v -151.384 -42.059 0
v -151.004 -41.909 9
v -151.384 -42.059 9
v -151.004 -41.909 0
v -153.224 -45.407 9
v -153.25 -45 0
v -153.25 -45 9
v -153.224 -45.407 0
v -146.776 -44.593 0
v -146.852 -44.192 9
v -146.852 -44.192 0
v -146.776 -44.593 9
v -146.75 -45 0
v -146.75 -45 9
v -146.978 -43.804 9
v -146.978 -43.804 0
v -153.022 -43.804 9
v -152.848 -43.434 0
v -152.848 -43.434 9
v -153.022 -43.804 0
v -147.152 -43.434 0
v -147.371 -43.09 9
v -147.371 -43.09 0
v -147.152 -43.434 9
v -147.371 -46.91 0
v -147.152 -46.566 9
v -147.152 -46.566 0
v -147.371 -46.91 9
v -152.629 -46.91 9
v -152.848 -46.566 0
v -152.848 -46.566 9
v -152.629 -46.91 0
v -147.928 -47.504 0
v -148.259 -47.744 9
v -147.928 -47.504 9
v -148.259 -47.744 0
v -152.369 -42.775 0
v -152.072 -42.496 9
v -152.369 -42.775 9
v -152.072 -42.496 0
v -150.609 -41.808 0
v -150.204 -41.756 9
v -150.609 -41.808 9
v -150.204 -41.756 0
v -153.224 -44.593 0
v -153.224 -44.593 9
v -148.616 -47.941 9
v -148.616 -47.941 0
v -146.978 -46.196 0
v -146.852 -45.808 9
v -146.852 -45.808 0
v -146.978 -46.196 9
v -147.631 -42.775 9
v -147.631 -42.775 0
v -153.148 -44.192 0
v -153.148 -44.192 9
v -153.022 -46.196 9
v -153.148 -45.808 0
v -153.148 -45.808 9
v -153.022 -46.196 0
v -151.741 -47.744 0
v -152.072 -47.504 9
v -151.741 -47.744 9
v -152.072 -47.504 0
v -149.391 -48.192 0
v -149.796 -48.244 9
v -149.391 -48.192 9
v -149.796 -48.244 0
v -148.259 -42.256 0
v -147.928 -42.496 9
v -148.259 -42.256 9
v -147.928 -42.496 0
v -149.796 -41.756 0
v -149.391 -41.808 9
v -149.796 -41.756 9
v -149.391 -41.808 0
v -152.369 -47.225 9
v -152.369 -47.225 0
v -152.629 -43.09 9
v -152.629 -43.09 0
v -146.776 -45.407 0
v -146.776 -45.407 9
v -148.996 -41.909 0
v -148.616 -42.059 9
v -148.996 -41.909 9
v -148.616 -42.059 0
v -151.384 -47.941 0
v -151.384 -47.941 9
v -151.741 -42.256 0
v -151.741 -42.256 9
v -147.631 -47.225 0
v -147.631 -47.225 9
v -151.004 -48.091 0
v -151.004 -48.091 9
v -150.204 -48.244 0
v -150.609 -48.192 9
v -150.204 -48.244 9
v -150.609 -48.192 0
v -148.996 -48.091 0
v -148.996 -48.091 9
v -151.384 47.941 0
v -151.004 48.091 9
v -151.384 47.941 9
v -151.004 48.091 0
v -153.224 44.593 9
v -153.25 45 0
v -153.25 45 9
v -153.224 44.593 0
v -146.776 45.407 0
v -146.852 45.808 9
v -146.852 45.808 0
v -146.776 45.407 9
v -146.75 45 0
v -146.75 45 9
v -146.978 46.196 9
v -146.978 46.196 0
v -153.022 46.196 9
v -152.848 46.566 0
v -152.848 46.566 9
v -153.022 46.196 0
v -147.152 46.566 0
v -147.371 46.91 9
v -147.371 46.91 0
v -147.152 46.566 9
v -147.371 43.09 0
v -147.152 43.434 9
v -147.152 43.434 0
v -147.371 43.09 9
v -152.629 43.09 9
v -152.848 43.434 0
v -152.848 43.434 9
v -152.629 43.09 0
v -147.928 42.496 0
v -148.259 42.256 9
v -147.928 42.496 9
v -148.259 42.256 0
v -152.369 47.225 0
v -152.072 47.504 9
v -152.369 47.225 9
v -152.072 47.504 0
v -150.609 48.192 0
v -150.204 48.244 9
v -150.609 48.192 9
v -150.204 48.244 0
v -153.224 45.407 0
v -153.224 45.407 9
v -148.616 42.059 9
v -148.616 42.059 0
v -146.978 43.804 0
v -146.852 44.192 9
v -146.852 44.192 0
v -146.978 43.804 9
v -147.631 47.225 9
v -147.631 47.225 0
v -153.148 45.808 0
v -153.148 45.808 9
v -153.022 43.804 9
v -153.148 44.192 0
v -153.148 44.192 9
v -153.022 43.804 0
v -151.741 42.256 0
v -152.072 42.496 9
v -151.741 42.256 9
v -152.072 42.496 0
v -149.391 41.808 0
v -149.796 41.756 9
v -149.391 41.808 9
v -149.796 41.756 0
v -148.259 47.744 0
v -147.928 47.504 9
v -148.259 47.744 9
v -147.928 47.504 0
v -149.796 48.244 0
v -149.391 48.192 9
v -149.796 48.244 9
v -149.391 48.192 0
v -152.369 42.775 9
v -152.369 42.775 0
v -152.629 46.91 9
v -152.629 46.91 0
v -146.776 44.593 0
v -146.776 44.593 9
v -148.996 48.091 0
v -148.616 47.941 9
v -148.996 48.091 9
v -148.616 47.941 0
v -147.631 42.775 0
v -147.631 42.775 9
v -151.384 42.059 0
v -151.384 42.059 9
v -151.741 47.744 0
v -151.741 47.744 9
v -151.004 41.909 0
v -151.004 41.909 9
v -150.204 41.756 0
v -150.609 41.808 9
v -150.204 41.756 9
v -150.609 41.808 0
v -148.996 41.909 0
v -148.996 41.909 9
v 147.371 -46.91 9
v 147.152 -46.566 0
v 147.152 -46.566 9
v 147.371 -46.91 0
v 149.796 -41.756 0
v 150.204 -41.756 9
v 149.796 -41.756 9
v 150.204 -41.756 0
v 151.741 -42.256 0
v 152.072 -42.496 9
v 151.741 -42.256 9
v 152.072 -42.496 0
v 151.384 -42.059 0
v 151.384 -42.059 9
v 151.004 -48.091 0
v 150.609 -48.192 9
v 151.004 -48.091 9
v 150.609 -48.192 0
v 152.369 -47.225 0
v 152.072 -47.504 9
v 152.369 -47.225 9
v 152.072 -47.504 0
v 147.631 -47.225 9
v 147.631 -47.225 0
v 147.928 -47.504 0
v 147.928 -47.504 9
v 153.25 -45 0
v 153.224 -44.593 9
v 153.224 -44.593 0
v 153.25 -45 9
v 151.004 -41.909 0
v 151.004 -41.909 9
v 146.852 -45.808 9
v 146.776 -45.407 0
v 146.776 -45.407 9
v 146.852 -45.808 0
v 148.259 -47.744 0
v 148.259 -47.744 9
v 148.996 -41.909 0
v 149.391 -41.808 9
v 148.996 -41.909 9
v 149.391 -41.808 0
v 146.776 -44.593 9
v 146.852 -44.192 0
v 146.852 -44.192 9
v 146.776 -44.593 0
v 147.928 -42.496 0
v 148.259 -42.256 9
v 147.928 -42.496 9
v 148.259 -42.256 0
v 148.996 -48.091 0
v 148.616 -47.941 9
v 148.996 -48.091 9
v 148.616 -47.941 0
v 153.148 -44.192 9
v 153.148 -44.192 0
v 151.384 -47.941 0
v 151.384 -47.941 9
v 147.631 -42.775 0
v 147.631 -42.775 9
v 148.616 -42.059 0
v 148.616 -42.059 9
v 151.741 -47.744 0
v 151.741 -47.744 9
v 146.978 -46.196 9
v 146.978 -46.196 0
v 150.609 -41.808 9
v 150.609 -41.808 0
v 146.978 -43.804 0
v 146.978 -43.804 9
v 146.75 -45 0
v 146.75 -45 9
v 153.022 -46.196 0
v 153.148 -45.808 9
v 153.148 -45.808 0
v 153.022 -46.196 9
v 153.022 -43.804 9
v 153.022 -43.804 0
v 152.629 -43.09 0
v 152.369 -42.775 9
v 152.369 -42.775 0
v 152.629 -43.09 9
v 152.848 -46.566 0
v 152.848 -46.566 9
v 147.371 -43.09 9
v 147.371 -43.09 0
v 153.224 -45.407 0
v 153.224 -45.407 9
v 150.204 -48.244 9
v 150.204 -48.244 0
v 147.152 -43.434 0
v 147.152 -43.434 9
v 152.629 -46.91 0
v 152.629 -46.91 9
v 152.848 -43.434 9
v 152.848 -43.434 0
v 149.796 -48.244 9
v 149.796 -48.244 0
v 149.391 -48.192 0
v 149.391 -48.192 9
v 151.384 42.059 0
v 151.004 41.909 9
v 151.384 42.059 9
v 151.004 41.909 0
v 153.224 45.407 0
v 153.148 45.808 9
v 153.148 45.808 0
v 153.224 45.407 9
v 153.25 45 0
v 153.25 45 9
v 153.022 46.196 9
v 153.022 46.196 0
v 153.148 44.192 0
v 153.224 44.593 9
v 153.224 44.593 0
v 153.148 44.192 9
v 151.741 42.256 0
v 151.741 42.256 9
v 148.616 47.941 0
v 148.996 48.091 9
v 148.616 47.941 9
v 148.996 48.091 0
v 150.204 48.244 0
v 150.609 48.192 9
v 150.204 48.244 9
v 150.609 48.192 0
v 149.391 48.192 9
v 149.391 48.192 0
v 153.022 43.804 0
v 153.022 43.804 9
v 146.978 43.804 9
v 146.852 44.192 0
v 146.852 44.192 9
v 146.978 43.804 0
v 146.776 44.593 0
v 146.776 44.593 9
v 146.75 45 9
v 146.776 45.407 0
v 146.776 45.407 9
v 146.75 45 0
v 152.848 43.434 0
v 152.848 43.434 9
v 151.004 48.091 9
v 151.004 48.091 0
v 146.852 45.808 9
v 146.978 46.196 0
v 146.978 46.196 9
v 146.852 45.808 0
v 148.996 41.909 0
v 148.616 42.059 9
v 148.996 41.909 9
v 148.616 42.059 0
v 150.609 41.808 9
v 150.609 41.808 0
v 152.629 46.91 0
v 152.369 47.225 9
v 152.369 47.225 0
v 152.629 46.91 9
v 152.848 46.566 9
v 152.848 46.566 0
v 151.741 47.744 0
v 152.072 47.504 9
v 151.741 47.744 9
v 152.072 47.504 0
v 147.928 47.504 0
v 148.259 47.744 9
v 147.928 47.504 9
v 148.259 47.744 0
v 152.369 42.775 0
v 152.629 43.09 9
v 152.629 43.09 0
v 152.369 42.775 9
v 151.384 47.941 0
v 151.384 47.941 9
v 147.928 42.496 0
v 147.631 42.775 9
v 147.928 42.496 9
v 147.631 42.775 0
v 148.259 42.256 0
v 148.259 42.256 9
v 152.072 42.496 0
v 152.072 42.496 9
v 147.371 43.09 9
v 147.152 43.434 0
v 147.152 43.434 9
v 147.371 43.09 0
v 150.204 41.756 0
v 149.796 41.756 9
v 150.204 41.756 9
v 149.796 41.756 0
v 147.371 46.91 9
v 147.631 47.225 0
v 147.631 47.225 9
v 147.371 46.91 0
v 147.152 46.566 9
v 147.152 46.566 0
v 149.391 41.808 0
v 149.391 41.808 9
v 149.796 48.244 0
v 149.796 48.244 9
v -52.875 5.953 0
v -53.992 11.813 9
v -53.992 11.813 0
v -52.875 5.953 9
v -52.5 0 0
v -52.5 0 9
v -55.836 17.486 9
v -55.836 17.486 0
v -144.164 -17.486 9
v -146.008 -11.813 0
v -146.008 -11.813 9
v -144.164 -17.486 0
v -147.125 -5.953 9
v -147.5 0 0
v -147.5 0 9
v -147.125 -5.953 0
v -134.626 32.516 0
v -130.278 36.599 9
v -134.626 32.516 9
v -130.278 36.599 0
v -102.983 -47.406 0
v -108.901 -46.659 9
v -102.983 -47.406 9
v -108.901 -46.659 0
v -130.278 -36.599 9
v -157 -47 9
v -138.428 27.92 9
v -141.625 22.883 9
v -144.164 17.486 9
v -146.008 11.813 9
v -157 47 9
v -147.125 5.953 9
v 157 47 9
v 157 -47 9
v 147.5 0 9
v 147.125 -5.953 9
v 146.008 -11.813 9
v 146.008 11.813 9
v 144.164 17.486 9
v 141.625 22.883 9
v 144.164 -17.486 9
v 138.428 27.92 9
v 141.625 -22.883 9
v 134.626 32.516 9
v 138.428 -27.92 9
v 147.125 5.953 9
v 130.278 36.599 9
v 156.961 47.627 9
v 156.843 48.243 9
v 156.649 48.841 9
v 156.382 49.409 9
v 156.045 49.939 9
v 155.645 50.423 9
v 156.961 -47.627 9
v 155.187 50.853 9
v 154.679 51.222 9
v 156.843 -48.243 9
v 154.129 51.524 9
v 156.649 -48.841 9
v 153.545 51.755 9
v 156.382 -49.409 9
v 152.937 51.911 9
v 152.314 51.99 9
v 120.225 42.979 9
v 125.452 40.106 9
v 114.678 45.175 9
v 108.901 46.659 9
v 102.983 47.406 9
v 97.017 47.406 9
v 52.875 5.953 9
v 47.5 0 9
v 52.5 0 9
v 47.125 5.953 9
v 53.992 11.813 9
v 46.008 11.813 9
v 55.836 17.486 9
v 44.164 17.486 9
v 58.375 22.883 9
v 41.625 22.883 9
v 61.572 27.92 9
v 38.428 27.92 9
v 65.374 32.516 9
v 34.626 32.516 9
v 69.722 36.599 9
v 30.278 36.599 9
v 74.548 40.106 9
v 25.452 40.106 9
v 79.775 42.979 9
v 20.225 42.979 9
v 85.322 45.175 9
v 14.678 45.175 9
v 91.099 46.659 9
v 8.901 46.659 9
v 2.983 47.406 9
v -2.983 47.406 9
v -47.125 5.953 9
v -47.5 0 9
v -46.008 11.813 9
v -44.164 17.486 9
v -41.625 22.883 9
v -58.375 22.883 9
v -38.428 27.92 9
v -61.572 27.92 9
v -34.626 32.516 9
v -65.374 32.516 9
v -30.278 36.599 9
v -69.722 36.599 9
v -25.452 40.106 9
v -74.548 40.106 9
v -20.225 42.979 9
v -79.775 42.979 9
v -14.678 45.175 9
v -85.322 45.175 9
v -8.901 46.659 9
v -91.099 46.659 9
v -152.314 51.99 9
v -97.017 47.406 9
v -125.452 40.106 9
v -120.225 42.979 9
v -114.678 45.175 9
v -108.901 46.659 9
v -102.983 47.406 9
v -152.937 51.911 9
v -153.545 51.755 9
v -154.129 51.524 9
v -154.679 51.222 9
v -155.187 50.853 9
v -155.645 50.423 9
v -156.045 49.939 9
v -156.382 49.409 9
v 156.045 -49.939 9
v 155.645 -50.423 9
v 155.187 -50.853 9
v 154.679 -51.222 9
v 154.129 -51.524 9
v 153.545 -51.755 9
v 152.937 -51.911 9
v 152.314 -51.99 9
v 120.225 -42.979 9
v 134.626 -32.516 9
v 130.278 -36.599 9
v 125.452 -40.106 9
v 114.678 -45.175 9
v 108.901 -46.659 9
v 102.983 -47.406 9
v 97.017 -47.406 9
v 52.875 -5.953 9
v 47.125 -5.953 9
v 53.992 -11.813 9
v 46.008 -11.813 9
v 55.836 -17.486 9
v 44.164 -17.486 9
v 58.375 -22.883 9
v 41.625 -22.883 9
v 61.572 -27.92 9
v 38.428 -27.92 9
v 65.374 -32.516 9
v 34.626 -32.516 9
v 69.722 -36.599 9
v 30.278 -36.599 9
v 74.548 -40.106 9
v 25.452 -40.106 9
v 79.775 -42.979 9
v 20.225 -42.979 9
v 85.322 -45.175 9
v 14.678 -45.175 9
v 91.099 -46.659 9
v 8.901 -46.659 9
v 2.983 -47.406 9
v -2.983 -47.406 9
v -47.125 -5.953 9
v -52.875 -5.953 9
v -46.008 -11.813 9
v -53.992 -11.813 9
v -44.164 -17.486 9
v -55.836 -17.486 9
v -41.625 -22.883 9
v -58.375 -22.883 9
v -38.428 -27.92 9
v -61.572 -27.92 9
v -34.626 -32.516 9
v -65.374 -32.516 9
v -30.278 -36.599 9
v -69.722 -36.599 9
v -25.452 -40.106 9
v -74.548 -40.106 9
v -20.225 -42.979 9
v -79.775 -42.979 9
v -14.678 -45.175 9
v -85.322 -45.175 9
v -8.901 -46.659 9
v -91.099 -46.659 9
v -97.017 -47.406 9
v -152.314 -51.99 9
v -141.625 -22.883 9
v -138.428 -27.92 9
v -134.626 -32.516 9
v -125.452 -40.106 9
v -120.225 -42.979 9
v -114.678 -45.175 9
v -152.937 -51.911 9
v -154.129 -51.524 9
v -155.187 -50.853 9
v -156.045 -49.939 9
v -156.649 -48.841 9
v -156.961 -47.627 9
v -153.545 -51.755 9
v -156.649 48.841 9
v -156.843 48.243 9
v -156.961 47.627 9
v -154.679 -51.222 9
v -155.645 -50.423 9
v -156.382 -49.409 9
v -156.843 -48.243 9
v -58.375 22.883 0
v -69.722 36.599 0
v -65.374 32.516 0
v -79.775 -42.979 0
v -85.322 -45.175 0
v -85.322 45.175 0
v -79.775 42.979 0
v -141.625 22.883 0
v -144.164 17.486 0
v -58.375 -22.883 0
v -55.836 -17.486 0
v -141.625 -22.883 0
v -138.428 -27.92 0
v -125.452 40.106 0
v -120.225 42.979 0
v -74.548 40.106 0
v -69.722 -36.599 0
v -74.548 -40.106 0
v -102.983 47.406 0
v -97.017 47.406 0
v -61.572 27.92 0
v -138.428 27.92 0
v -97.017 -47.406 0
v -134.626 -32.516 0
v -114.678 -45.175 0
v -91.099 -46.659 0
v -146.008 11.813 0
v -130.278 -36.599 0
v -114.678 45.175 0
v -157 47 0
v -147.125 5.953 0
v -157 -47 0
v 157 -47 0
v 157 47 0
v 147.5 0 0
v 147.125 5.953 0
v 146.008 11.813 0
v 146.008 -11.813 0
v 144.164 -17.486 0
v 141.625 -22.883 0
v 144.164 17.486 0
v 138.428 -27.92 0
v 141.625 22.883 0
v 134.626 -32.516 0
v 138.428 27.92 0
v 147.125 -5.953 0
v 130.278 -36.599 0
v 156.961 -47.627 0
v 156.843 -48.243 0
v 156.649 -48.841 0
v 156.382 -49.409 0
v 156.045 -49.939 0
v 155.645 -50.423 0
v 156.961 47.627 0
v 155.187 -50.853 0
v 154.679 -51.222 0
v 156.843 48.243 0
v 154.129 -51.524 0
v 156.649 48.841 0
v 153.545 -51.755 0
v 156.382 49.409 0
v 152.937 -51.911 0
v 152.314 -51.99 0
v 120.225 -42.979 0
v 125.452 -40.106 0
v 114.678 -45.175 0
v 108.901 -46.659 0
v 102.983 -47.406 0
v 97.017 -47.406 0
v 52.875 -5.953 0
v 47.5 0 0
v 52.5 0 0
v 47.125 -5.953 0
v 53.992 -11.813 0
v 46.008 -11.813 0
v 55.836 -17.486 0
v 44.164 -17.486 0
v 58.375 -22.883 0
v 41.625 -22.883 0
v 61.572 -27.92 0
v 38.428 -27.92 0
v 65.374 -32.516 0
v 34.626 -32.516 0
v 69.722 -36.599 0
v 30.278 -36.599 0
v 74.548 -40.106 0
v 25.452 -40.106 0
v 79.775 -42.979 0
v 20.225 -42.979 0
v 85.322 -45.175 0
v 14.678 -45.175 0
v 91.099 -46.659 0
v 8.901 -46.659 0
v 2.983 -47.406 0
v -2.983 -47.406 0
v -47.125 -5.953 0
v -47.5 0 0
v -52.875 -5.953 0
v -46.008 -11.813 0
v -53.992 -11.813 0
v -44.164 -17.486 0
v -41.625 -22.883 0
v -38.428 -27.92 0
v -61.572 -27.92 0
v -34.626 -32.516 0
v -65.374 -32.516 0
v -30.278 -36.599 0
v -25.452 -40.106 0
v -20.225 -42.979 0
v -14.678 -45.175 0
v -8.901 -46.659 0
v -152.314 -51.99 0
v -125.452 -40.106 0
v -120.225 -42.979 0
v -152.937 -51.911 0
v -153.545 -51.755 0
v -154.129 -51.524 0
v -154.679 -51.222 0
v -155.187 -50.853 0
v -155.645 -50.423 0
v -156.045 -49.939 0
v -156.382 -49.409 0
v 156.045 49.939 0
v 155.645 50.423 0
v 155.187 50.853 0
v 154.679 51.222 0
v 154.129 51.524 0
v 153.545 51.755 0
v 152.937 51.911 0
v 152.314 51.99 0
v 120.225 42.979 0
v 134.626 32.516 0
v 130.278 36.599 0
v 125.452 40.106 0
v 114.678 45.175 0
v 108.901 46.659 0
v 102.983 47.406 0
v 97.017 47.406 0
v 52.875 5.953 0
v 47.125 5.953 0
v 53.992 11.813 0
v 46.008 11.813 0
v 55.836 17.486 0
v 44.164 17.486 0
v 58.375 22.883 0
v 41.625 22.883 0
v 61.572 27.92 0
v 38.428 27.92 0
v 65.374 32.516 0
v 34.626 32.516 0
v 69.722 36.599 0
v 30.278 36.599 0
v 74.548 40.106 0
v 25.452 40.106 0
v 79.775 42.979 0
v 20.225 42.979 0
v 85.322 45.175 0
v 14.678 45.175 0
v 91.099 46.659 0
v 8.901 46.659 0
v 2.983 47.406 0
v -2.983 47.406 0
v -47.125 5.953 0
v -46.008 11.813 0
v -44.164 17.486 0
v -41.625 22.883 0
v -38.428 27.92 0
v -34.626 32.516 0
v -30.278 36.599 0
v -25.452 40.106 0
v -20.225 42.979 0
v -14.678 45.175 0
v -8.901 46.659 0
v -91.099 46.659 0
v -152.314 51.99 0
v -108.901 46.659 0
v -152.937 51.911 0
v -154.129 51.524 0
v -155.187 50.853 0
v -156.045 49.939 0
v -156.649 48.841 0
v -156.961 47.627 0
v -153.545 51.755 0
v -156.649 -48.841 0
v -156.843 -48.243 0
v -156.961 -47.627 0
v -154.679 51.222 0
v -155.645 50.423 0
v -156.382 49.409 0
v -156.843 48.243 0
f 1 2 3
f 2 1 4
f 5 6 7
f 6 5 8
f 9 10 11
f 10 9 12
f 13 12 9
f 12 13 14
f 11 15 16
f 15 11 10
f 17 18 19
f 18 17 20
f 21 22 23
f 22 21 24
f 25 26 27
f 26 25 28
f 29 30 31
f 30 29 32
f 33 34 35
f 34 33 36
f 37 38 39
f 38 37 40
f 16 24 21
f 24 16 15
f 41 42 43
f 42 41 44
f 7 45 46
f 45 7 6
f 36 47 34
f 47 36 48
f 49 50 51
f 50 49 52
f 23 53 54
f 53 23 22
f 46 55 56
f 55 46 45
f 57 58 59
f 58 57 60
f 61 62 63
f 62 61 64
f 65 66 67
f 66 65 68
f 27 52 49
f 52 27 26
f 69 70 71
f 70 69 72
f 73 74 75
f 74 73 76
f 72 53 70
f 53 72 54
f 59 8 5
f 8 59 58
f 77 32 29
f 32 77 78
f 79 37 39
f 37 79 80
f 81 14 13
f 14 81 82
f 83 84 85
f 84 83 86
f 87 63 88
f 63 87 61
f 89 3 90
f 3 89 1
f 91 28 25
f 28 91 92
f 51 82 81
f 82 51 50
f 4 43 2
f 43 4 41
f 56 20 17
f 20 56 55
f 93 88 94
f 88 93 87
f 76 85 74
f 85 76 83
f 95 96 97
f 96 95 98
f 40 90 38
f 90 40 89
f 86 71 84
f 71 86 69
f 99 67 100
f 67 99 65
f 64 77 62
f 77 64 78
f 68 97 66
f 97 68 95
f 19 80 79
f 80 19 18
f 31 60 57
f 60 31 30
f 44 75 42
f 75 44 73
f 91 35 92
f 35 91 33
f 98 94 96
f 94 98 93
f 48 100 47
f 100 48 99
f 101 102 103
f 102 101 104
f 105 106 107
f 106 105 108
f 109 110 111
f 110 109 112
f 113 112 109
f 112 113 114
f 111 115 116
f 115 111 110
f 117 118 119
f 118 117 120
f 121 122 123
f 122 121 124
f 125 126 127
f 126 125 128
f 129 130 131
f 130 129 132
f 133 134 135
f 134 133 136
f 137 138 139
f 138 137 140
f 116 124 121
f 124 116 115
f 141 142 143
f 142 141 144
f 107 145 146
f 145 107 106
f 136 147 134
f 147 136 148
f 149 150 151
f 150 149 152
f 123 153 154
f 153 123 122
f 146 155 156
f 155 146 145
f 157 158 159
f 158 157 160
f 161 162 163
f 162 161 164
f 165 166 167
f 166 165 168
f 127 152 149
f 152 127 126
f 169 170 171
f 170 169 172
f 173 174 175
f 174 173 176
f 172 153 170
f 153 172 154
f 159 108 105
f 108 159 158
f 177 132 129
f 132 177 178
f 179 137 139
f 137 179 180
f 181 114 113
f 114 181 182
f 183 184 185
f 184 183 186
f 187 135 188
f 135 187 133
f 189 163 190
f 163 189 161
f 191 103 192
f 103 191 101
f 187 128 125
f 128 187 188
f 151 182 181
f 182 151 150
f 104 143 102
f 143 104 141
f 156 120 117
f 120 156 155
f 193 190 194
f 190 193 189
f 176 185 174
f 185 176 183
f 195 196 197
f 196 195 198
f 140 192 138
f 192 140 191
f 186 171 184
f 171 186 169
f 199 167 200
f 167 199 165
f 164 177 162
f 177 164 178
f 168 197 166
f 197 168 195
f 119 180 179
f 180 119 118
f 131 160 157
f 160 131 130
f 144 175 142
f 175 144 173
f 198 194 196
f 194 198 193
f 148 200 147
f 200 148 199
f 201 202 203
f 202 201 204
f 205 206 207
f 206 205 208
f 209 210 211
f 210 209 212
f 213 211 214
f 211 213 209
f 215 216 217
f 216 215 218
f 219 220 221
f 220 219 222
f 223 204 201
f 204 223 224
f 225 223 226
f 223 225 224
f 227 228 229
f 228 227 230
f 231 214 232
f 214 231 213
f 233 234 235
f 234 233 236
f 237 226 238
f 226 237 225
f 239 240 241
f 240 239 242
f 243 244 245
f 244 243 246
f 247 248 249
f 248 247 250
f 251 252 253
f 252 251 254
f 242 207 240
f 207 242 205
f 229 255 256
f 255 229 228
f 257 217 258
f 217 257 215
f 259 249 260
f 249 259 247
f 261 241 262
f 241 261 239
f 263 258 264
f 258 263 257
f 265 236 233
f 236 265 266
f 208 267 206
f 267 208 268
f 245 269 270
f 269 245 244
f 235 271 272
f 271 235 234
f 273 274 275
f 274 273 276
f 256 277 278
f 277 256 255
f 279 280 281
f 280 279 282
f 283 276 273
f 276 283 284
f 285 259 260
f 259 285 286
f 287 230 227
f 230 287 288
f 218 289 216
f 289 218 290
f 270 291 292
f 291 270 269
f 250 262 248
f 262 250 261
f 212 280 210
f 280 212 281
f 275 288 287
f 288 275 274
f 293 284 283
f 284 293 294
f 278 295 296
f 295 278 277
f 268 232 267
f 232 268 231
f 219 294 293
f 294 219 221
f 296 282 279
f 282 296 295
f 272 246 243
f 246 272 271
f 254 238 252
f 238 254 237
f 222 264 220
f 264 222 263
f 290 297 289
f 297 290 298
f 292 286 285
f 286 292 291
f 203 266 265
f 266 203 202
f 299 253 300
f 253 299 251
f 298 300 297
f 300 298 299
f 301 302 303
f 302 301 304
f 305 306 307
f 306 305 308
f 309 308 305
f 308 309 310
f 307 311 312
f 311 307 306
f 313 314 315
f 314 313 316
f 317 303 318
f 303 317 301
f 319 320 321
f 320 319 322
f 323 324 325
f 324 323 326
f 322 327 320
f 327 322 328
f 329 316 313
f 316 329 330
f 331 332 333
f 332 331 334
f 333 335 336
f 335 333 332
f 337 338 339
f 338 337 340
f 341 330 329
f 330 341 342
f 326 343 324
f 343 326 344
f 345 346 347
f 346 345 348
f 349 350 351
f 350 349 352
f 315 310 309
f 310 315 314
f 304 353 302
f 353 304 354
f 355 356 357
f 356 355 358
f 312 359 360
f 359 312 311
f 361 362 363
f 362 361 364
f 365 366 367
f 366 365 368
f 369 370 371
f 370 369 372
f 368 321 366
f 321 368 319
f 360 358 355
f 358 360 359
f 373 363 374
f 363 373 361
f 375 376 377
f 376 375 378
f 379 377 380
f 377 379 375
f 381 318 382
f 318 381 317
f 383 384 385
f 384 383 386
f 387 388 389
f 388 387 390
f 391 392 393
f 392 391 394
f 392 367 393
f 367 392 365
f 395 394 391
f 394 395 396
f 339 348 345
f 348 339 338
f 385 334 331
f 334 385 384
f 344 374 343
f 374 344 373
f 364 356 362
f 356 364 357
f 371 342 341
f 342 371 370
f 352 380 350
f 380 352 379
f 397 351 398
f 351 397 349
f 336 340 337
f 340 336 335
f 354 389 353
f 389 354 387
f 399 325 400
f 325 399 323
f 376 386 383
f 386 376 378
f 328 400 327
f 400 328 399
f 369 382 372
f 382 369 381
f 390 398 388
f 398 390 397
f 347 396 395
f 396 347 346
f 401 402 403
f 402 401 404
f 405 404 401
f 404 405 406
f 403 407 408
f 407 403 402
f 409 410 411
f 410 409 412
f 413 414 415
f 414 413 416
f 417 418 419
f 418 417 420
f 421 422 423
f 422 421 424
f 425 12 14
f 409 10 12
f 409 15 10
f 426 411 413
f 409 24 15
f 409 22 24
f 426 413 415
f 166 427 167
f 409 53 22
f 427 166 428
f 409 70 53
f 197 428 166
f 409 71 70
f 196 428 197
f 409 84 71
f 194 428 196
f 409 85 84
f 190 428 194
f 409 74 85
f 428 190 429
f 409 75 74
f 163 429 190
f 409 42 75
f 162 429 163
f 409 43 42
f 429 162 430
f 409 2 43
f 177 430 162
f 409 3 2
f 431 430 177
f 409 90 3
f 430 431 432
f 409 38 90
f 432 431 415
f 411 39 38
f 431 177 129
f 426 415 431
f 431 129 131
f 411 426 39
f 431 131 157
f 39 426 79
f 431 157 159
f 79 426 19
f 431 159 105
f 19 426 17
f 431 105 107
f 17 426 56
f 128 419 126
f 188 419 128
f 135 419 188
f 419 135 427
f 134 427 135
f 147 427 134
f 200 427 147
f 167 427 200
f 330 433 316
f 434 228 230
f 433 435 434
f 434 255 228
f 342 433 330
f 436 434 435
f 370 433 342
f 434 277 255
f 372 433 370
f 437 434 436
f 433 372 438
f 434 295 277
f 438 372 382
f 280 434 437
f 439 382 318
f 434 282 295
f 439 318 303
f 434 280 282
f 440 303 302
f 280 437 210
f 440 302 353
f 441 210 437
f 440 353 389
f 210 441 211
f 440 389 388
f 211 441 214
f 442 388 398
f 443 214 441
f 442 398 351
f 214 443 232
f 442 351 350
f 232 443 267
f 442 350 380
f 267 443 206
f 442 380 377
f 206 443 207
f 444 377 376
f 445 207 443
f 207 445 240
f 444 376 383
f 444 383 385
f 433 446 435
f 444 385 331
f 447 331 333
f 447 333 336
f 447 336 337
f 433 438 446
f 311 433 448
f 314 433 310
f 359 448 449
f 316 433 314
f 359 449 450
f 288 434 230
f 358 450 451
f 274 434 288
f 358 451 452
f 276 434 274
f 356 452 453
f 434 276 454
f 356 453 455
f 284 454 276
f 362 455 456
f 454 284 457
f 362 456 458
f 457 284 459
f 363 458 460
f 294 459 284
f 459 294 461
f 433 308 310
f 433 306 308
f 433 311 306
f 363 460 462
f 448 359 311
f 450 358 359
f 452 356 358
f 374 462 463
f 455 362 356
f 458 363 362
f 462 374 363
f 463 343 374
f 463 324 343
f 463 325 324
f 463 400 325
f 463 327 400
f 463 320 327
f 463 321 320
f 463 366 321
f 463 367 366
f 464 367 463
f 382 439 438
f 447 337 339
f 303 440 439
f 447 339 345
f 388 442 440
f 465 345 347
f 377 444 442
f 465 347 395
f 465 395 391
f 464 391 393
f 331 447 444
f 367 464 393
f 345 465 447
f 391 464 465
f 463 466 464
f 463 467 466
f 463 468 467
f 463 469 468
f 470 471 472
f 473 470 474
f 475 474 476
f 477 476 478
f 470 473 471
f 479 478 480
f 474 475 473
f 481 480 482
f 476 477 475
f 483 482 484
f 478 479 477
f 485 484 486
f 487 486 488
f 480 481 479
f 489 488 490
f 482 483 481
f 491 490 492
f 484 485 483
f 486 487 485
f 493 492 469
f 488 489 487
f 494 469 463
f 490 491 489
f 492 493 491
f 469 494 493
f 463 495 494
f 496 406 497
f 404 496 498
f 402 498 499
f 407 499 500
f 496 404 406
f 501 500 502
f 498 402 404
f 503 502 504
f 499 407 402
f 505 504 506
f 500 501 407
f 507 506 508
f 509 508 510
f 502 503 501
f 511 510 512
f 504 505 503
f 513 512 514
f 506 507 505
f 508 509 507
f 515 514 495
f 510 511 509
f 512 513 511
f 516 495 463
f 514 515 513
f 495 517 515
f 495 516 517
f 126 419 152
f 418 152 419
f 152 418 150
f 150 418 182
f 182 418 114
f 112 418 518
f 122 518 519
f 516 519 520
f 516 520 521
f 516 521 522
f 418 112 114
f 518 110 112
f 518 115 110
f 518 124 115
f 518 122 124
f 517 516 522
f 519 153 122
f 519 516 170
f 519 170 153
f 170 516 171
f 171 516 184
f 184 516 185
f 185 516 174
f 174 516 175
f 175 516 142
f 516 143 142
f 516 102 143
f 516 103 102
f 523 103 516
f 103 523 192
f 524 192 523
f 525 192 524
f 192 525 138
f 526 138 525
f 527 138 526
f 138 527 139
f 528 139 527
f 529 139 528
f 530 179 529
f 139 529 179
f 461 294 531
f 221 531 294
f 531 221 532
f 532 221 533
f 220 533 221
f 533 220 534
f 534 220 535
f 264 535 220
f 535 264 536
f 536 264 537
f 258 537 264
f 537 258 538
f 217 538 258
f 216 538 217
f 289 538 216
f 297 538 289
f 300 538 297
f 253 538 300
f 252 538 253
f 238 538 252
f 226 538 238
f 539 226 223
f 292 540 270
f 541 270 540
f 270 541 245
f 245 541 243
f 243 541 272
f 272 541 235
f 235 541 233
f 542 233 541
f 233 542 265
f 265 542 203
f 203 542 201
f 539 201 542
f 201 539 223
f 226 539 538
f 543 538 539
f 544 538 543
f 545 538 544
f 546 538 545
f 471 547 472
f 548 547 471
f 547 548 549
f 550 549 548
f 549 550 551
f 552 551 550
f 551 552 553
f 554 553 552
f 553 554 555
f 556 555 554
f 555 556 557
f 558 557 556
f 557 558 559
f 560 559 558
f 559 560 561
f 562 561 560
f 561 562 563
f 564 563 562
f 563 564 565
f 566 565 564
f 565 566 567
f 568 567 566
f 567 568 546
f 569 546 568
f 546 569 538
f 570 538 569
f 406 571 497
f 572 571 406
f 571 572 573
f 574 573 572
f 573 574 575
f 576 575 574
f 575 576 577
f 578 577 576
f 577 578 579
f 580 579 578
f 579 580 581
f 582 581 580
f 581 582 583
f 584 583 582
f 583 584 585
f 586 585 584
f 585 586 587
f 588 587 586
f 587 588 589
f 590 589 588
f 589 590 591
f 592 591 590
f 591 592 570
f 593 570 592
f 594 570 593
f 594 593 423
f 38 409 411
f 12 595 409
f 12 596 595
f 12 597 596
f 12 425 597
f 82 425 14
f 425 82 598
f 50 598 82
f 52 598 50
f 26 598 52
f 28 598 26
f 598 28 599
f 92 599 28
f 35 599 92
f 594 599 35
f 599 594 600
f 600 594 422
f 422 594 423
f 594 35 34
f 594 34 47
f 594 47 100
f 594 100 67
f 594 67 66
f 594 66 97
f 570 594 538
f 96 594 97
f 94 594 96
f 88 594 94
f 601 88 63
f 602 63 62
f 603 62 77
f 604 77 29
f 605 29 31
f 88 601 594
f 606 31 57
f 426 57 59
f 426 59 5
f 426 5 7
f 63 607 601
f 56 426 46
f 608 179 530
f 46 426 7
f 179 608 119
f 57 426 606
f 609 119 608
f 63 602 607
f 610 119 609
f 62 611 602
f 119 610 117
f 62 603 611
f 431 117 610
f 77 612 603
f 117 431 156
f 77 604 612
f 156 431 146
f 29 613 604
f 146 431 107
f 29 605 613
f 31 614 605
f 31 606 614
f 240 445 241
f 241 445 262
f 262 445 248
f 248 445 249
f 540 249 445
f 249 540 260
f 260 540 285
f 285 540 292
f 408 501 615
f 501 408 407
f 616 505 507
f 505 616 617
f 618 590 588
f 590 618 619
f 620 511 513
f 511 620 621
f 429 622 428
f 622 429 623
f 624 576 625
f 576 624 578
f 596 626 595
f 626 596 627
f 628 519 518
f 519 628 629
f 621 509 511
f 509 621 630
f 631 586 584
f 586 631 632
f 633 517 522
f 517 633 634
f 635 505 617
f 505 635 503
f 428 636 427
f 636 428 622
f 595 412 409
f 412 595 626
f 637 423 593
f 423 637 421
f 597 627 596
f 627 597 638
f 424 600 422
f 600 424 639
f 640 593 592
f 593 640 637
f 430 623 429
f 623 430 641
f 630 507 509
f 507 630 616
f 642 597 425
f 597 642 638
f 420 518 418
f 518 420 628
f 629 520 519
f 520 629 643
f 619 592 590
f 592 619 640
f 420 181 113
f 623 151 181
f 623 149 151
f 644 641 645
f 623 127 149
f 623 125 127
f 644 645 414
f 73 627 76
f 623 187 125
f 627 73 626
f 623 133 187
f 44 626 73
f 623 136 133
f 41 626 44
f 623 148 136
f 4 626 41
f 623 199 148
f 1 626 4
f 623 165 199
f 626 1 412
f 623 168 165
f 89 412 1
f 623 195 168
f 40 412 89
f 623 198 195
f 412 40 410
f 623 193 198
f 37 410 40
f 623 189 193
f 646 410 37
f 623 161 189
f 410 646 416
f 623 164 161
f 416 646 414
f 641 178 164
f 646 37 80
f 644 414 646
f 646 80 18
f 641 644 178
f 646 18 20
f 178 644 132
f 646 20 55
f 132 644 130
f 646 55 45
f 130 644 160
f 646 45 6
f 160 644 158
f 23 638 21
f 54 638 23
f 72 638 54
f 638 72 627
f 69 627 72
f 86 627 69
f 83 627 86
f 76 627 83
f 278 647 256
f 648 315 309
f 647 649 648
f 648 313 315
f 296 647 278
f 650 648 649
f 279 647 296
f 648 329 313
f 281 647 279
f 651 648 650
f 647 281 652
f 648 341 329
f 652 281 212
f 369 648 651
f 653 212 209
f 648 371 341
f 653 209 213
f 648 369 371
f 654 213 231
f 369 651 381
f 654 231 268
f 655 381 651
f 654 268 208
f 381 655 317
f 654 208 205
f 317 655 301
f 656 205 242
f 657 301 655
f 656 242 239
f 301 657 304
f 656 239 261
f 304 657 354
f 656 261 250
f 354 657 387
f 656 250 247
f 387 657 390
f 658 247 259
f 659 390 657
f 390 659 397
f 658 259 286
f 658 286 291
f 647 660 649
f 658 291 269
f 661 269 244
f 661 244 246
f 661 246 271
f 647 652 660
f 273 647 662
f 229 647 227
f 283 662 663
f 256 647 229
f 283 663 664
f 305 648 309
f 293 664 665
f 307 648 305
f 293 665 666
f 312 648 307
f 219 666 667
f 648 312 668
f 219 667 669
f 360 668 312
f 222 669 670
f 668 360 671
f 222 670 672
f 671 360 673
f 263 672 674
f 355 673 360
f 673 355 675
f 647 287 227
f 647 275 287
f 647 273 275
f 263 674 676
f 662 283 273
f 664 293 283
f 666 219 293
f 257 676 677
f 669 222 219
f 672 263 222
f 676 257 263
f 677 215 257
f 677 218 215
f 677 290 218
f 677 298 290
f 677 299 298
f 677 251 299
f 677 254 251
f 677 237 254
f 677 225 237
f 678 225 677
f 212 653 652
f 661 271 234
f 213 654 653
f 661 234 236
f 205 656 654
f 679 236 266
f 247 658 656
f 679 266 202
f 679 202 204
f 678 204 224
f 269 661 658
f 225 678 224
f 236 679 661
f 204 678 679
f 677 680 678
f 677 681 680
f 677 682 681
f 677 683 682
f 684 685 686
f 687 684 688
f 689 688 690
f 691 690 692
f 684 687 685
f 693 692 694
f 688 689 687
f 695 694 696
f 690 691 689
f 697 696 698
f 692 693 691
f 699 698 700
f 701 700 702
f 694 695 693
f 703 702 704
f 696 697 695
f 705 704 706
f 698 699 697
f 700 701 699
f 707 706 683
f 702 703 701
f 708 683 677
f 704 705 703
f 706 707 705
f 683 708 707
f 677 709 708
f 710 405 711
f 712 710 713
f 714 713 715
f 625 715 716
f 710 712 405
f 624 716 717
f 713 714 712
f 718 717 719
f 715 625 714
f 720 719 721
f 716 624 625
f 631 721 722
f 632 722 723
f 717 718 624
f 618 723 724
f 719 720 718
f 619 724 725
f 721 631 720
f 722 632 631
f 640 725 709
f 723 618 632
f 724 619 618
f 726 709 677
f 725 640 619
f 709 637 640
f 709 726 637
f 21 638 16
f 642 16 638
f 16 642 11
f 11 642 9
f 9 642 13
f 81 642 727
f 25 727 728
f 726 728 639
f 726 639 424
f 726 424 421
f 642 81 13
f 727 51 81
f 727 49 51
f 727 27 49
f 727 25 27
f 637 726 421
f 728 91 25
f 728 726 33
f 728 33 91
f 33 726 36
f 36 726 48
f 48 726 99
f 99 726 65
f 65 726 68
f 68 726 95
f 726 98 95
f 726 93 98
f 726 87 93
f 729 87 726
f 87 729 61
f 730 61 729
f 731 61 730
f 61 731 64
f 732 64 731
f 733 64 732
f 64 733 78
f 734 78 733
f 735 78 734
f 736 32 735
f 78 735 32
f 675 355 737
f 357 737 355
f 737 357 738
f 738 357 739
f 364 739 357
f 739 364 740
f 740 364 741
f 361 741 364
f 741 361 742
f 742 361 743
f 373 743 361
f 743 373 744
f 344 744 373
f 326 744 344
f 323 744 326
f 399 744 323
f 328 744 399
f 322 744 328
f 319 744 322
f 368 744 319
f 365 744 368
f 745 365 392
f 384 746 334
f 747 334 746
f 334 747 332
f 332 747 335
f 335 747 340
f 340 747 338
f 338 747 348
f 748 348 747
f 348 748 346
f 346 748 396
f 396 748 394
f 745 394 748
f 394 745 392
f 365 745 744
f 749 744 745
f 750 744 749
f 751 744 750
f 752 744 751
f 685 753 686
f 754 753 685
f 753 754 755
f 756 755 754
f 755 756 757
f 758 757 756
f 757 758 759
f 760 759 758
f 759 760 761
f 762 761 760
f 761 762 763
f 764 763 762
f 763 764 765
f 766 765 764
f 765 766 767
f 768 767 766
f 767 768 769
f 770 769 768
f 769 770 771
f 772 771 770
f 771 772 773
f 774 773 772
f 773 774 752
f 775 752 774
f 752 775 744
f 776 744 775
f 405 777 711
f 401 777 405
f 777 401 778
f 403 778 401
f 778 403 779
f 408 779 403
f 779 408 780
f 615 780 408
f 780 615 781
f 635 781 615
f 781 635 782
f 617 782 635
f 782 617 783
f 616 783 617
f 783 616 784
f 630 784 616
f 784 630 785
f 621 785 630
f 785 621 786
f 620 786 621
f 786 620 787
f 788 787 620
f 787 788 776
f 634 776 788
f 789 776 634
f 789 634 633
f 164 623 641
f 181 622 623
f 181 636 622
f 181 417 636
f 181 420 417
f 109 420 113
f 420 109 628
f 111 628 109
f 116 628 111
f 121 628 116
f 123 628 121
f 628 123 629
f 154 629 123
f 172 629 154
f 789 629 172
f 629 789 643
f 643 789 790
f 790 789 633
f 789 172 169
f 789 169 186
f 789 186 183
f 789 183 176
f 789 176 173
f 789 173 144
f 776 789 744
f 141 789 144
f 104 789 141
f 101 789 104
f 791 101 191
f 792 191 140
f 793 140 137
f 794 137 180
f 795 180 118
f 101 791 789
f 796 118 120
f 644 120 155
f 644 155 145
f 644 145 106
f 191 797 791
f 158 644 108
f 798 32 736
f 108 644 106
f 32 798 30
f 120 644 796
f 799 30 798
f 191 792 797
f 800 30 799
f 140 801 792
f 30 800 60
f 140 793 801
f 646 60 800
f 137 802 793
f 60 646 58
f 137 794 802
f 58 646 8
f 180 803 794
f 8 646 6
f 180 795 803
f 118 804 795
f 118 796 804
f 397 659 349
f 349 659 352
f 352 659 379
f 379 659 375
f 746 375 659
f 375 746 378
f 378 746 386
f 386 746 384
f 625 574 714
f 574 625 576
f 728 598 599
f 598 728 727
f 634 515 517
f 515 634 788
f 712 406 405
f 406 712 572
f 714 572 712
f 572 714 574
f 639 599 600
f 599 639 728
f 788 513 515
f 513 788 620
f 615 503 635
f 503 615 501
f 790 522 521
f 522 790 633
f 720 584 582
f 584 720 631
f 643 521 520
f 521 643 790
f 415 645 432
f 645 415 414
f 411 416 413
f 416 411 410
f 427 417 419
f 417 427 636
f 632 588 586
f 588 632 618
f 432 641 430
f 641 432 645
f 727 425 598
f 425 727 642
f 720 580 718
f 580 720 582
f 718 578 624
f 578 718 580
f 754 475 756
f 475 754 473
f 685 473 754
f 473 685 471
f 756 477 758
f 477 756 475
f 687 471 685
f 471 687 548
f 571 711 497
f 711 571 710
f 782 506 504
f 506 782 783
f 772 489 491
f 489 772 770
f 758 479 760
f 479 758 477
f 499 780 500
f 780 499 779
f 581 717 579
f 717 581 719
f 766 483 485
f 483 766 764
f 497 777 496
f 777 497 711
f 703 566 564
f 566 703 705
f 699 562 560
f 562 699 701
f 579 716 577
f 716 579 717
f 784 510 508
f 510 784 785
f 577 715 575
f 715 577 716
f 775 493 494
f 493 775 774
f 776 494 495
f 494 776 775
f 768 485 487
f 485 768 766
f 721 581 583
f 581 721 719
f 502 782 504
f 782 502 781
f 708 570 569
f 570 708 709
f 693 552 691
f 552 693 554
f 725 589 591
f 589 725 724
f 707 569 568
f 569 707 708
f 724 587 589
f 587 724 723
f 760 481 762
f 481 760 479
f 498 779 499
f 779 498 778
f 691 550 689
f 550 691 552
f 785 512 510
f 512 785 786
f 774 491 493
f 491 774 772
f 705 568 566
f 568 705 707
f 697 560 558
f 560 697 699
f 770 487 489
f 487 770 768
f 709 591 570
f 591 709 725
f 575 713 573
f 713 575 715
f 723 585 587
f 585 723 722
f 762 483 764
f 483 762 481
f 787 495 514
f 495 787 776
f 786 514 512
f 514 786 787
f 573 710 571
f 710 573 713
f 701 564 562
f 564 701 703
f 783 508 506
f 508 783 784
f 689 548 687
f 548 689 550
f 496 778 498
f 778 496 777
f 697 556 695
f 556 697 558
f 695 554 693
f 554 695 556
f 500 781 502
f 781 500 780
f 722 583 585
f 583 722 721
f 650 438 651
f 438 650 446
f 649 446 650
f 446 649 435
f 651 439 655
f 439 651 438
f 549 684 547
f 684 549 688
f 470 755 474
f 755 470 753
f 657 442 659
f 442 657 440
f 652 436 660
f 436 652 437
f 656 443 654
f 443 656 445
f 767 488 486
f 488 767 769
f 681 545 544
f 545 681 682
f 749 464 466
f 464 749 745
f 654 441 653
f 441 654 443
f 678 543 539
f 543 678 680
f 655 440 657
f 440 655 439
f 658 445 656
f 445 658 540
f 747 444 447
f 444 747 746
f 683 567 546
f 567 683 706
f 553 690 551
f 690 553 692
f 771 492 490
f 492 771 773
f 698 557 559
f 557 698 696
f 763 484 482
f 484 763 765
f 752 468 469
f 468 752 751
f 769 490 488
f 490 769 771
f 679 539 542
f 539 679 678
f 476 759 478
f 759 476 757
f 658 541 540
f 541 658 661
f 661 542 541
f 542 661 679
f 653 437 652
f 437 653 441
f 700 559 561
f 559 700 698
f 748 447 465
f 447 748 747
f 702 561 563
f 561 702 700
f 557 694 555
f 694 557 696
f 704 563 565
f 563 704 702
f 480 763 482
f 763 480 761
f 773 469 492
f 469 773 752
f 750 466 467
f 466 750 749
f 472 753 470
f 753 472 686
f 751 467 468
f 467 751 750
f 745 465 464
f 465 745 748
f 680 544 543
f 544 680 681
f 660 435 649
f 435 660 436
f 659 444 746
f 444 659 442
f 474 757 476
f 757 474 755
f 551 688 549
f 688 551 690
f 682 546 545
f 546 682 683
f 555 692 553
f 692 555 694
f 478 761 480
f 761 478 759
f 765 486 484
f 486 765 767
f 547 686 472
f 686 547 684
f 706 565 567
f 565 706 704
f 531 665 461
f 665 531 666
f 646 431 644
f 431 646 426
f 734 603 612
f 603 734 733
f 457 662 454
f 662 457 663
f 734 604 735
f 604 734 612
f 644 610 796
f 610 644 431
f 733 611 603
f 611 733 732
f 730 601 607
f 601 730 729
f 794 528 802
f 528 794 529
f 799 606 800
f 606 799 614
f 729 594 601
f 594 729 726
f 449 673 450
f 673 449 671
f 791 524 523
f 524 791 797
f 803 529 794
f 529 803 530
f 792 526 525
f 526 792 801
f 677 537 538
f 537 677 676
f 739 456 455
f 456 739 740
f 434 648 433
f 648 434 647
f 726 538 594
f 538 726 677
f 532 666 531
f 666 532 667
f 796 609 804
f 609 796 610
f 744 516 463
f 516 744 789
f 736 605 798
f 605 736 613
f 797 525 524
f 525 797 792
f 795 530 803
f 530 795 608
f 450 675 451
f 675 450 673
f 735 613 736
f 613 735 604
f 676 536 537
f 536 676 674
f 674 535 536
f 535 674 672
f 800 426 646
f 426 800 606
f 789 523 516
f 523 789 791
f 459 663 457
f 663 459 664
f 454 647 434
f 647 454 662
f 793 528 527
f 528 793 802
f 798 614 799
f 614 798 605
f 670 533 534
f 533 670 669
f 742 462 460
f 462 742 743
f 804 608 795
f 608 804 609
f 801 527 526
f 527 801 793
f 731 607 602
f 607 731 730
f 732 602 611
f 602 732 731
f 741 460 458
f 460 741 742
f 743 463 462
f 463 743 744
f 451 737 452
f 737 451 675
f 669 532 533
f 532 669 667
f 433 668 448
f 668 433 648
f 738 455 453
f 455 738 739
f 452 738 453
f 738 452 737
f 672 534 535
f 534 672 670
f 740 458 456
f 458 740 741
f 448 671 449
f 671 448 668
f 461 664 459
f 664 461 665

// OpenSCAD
$fn = 50;


difference() {
	union() {
		hull() {
			translate(v = [-152.0000000000, 47.0000000000, 0]) {
				cylinder(h = 9, r = 5);
			}
			translate(v = [152.0000000000, 47.0000000000, 0]) {
				cylinder(h = 9, r = 5);
			}
			translate(v = [-152.0000000000, -47.0000000000, 0]) {
				cylinder(h = 9, r = 5);
			}
			translate(v = [152.0000000000, -47.0000000000, 0]) {
				cylinder(h = 9, r = 5);
			}
		}
	}
	union() {
		#translate(v = [-150.0000000000, -45.0000000000, -100.0000000000]) {
			cylinder(h = 200, r = 3.2500000000);
		}
		#translate(v = [-150.0000000000, 45.0000000000, -100.0000000000]) {
			cylinder(h = 200, r = 3.2500000000);
		}
		#translate(v = [150.0000000000, -45.0000000000, -100.0000000000]) {
			cylinder(h = 200, r = 3.2500000000);
		}
		#translate(v = [150.0000000000, 45.0000000000, -100.0000000000]) {
			cylinder(h = 200, r = 3.2500000000);
		}
		#translate(v = [-100.0000000000, 0, 0]) {
			cylinder(h = 9, r = 47.5000000000);
		}
		#cylinder(h = 9, r = 47.5000000000);
		#translate(v = [100.0000000000, 0, 0]) {
			cylinder(h = 9, r = 47.5000000000);
		}
	}
}
